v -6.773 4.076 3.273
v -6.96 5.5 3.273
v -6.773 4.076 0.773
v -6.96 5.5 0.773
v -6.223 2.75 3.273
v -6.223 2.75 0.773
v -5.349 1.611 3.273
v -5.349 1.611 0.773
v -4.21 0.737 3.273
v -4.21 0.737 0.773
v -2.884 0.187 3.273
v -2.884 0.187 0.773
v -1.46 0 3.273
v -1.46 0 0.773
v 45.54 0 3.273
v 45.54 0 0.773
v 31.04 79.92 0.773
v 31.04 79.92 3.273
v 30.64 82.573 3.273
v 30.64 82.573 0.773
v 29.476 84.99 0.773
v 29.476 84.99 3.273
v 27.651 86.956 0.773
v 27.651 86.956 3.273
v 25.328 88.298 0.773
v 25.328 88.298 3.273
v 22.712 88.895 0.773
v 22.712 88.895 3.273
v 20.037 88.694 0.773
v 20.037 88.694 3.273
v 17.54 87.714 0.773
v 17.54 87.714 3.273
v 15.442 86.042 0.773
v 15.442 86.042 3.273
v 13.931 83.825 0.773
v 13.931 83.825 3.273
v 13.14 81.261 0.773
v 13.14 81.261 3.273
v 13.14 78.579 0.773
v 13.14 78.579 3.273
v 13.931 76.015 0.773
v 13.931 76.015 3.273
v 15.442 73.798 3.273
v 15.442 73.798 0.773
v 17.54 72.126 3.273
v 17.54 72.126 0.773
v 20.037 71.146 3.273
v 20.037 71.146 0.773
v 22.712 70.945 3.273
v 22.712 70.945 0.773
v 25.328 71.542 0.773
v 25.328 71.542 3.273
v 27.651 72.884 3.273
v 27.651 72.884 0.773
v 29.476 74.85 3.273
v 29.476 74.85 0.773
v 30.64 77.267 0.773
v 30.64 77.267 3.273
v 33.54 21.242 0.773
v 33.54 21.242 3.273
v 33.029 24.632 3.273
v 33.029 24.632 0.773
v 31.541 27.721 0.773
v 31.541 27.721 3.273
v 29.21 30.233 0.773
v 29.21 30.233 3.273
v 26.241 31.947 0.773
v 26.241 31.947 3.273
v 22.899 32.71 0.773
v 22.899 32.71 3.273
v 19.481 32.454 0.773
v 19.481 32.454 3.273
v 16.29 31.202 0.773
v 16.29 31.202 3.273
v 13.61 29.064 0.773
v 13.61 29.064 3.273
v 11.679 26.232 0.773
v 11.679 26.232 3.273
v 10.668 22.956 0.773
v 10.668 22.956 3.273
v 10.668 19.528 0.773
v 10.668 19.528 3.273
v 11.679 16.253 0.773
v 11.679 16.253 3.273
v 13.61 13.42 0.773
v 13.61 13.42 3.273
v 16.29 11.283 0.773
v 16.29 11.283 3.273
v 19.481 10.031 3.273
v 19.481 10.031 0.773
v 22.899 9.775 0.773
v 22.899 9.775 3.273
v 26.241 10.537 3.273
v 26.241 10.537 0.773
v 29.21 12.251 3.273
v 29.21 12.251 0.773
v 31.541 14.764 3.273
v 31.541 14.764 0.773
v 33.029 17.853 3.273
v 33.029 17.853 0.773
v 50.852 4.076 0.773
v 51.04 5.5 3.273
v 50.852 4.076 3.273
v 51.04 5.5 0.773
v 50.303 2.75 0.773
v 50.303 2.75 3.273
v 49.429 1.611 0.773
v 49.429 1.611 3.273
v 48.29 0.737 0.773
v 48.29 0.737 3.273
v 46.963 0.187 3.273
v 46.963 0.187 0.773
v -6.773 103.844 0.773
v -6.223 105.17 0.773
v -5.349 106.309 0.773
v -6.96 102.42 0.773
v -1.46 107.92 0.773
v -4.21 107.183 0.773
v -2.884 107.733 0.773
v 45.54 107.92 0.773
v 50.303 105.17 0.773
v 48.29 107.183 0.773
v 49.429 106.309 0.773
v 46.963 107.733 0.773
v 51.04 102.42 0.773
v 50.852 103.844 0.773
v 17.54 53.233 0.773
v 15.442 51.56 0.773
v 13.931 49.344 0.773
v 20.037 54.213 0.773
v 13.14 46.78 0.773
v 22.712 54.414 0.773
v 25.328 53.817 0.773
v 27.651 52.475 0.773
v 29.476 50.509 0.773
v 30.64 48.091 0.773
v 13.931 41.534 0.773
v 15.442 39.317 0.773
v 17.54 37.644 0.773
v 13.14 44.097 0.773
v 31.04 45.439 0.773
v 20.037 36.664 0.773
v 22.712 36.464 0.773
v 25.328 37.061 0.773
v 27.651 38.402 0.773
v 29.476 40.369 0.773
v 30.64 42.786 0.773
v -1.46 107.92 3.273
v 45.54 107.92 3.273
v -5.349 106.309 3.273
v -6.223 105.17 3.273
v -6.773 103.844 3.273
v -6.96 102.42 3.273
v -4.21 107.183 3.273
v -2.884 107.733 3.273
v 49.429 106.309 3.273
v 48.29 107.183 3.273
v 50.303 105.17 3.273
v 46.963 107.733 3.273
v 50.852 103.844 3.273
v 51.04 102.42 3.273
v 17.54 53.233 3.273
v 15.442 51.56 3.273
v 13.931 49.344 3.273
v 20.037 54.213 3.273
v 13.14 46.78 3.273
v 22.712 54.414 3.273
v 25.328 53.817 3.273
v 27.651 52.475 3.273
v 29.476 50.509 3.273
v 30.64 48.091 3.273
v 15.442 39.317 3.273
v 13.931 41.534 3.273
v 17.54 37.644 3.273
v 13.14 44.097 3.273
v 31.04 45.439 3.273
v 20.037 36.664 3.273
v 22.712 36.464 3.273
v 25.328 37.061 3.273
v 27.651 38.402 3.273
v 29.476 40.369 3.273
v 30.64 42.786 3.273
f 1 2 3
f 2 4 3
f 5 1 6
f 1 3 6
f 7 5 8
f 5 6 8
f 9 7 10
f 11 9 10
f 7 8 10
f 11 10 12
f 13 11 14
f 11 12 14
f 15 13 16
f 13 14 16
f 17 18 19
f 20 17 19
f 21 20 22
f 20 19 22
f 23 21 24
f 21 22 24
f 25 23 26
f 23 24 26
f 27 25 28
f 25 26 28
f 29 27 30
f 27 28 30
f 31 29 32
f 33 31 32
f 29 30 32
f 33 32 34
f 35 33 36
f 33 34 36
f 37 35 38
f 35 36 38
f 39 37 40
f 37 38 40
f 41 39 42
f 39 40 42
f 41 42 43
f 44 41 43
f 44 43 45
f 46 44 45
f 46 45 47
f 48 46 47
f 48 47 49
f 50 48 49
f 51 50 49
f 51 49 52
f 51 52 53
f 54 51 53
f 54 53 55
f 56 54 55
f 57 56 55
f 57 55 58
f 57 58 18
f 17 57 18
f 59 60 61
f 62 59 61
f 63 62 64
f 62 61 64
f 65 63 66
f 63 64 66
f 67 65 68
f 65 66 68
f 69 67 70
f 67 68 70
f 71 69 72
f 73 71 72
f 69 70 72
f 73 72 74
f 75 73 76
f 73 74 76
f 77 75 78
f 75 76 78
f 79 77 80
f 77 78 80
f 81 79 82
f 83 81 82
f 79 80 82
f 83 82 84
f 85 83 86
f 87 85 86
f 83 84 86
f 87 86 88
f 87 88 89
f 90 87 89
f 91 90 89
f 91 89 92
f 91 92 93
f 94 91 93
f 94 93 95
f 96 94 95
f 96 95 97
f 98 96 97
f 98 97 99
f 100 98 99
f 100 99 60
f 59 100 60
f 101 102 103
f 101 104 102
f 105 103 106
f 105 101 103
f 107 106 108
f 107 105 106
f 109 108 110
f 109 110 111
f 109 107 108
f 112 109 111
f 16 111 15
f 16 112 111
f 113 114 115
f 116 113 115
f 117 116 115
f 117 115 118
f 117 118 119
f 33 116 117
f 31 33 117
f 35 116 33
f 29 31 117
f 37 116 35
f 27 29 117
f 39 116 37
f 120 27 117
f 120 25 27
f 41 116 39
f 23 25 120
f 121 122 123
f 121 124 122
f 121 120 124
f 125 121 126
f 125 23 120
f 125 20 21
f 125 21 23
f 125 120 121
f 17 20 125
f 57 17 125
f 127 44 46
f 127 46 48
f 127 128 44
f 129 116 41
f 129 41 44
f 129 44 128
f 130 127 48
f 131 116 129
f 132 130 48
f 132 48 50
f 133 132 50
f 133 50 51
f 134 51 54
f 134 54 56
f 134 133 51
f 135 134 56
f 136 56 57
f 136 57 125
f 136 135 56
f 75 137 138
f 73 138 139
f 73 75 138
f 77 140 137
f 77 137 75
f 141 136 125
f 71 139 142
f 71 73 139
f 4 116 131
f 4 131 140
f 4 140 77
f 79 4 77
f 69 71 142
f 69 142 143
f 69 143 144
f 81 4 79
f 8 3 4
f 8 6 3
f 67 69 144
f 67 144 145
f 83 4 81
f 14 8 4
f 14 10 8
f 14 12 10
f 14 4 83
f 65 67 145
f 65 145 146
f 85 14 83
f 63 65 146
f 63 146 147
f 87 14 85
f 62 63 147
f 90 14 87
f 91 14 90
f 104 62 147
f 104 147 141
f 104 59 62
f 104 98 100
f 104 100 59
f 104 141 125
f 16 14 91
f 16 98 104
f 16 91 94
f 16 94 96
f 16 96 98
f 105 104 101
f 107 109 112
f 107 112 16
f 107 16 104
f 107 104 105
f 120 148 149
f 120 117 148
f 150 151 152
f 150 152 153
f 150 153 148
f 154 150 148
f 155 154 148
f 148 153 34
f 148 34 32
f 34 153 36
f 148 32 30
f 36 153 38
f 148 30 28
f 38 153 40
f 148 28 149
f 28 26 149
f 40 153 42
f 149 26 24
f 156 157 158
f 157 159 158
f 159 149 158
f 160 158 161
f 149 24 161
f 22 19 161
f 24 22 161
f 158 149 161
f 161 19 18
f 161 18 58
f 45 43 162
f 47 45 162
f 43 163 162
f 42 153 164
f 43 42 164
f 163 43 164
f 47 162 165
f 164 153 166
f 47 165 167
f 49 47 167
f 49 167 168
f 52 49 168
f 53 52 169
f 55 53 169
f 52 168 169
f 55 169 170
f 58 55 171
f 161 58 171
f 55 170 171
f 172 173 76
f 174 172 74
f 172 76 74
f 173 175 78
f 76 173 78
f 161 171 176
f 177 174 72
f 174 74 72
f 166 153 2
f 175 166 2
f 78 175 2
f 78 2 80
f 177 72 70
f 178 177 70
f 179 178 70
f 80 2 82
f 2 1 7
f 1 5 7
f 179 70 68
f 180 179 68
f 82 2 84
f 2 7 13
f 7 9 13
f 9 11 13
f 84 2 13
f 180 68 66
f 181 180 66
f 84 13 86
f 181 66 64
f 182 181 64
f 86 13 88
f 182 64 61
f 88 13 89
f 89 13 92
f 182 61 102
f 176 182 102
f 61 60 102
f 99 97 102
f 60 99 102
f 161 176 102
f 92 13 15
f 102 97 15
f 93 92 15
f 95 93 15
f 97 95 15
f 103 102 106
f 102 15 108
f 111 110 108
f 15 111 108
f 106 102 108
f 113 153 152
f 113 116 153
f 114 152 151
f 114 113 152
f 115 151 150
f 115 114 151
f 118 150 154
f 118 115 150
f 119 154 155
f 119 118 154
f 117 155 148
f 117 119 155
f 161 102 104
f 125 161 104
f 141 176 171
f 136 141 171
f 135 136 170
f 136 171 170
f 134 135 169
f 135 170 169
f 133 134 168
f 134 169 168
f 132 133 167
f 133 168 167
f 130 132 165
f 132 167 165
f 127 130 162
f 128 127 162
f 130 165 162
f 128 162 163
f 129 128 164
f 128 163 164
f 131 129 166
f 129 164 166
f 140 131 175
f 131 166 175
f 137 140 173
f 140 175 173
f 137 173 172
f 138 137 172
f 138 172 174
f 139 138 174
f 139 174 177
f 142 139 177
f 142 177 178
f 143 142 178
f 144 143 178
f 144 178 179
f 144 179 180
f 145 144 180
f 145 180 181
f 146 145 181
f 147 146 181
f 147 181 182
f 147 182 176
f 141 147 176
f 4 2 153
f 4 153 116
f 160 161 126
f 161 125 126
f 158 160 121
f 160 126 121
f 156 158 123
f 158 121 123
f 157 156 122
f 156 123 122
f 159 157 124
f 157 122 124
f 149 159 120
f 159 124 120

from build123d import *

# Parameters (mm, degrees)
ESBO_O1_W                = 58
ESBO_O1_H                = 2.5
RESSALTO_EXTRUS_O1_DEPTH = 107.92
FILETE1_R                = 5.5
ESBO_O2_R                = 9
CORTE_EXTRUS_O1_DEPTH    = 111.42
ESBO_O5_R                = 11.5
CORTE_EXTRUS_O2_DEPTH    = 111.42


with BuildPart() as part:
    # Esboço1 → Ressalto-extrusão1 (new body)
    with BuildSketch(Plane(origin=(0, 0, 0), x_dir=(1, 0, 0), z_dir=(0, 1, 0))):
        with Locations((22.039718439, -2.022727273)):
            Rectangle(ESBO_O1_W, ESBO_O1_H)
    extrude(amount=RESSALTO_EXTRUS_O1_DEPTH)

    # Filete1
    filete1_edges = [part.edges().sort_by_distance(p)[0] for p in [
        (51.039718439, 107.92, 2.022727273),
        (-6.960281561, 107.92, 2.022727273),
        (51.039718439, 0, 2.022727273),
        (-6.960281561, 0, 2.022727273),
    ]]
    fillet(filete1_edges, radius=FILETE1_R)

    # Esboço2 → Corte-extrusão1 (cut)
    with BuildSketch(Plane.XY.offset(3.272727273)):
        with Locations((22.039718439, 79.92)):
            Circle(ESBO_O2_R)
        with Locations((22.039718439, 45.4387)):
            Circle(ESBO_O2_R)
    extrude(amount=-CORTE_EXTRUS_O1_DEPTH, mode=Mode.SUBTRACT)

    # Esboço5 → Corte-extrusão2 (cut)
    with BuildSketch(Plane.XY.offset(3.272727273)):
        with Locations((22.039718439, 21.2424)):
            Circle(ESBO_O5_R)
    extrude(amount=-CORTE_EXTRUS_O2_DEPTH, mode=Mode.SUBTRACT)


solid = part.part
